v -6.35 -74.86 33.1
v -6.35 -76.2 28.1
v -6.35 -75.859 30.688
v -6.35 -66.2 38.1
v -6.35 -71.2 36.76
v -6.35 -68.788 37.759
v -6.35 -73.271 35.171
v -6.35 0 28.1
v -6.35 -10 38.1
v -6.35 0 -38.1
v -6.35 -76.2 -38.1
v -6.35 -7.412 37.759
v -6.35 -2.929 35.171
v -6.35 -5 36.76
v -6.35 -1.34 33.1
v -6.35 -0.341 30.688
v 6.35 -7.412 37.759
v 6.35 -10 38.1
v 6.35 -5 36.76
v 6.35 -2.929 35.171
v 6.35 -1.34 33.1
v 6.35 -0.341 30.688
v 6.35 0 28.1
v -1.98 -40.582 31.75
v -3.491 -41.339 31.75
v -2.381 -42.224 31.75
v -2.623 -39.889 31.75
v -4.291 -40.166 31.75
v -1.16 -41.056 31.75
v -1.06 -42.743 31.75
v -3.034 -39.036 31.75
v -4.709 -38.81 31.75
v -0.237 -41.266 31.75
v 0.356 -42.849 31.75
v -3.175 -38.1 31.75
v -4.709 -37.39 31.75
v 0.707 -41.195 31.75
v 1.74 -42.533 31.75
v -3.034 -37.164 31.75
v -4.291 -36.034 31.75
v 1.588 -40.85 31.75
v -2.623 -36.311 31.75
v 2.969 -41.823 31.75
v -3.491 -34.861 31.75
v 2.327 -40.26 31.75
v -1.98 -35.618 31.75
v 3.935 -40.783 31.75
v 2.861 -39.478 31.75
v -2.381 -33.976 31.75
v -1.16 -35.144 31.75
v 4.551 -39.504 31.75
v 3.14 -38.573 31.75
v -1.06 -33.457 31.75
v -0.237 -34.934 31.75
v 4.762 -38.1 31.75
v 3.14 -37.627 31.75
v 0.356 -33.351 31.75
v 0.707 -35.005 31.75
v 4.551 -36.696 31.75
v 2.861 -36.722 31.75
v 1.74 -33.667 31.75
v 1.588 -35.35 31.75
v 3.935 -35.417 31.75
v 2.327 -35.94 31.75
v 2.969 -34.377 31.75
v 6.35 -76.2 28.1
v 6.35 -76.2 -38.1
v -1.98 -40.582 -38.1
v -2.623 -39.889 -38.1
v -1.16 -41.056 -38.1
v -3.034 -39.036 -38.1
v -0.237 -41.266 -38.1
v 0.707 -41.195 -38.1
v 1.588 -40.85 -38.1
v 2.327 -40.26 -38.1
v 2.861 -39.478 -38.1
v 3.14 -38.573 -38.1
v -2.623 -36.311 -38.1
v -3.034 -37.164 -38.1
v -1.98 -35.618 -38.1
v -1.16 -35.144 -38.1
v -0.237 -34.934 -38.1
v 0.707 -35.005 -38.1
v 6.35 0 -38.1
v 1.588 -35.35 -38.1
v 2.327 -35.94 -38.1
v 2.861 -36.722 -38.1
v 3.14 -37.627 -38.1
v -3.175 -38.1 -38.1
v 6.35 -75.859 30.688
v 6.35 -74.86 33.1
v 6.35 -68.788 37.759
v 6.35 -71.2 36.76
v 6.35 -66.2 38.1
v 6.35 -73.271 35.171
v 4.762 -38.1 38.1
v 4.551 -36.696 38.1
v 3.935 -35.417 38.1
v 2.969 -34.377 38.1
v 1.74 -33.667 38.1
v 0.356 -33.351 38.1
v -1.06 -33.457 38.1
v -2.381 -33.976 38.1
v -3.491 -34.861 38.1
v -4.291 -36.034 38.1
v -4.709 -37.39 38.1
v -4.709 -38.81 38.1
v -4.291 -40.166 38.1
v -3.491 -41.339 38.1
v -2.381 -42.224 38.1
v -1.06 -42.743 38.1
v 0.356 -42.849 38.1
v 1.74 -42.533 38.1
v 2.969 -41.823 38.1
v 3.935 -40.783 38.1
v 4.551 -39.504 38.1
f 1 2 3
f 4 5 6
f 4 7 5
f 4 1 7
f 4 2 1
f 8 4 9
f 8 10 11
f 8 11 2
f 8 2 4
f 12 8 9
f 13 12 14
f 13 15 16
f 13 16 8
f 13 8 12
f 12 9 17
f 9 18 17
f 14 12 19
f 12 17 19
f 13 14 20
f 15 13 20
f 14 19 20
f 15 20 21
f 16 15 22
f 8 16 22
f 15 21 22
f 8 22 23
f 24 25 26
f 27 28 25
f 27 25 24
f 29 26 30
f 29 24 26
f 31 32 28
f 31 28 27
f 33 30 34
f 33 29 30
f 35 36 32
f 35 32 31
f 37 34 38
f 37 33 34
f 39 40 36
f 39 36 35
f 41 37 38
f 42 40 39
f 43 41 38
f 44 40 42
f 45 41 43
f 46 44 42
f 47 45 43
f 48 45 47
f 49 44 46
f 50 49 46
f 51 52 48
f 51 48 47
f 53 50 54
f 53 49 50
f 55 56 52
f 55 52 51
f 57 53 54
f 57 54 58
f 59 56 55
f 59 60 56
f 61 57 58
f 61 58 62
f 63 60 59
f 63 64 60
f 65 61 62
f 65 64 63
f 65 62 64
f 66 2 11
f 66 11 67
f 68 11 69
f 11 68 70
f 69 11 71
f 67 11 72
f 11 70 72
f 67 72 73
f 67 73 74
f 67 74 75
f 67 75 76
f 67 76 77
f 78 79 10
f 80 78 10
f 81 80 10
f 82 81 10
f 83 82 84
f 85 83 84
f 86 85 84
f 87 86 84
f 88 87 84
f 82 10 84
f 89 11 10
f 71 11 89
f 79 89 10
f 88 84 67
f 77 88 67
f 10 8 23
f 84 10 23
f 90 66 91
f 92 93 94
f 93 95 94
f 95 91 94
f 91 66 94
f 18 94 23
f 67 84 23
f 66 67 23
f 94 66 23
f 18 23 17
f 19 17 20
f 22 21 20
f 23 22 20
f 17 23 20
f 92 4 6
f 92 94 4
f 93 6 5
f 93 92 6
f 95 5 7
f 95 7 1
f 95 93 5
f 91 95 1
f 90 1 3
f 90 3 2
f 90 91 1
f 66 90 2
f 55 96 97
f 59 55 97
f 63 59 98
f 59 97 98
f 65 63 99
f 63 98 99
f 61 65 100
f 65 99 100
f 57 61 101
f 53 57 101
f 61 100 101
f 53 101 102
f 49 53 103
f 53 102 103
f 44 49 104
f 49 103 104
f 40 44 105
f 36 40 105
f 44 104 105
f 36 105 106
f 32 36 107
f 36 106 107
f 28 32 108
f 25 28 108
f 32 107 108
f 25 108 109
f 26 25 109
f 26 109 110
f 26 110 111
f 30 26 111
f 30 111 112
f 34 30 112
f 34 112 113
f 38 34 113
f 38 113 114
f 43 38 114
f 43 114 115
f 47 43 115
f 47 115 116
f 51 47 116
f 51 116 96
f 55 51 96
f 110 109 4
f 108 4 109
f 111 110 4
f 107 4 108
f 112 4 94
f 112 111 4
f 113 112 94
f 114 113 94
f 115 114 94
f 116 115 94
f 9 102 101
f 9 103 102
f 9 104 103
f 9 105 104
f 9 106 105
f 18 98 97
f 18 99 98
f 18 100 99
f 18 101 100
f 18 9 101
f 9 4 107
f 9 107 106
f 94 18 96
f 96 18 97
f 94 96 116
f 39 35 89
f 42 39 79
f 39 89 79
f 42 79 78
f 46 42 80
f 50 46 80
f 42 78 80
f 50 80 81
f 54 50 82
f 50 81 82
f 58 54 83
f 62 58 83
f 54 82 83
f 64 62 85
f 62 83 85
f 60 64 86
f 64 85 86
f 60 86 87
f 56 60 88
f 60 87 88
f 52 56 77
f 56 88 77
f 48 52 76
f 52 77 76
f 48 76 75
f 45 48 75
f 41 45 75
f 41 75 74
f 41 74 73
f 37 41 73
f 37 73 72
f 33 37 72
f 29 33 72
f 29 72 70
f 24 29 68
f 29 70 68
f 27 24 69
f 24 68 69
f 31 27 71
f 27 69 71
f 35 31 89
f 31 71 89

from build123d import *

# Parameters (mm, degrees)
F0_W           = 12.7
F0_H           = 76.2
F1_DEPTH       = 76.2
F3_D           = 6.35
F3_CBORE_D     = 9.525
F3_CBORE_DEPTH = 6.35
F4_R           = 10


with BuildPart() as f1:
    # F0 (on Front) → F1 (new body)
    with BuildSketch(Plane.XZ):
        Rectangle(F0_W, F0_H)
    extrude(amount=F1_DEPTH)

    # F3 (through all)
    with Locations(Plane.XY.offset(38.1)):
        with Locations((0, -38.1)):
            CounterBoreHole(F3_D / 2, F3_CBORE_D / 2, F3_CBORE_DEPTH)

    # F4
    f4_edges = [f1.edges().sort_by_distance(p)[0] for p in [
        (0, -76.2, 38.1),
        (0, 0, 38.1),
    ]]
    fillet(f4_edges, radius=F4_R)


solid = f1.part
